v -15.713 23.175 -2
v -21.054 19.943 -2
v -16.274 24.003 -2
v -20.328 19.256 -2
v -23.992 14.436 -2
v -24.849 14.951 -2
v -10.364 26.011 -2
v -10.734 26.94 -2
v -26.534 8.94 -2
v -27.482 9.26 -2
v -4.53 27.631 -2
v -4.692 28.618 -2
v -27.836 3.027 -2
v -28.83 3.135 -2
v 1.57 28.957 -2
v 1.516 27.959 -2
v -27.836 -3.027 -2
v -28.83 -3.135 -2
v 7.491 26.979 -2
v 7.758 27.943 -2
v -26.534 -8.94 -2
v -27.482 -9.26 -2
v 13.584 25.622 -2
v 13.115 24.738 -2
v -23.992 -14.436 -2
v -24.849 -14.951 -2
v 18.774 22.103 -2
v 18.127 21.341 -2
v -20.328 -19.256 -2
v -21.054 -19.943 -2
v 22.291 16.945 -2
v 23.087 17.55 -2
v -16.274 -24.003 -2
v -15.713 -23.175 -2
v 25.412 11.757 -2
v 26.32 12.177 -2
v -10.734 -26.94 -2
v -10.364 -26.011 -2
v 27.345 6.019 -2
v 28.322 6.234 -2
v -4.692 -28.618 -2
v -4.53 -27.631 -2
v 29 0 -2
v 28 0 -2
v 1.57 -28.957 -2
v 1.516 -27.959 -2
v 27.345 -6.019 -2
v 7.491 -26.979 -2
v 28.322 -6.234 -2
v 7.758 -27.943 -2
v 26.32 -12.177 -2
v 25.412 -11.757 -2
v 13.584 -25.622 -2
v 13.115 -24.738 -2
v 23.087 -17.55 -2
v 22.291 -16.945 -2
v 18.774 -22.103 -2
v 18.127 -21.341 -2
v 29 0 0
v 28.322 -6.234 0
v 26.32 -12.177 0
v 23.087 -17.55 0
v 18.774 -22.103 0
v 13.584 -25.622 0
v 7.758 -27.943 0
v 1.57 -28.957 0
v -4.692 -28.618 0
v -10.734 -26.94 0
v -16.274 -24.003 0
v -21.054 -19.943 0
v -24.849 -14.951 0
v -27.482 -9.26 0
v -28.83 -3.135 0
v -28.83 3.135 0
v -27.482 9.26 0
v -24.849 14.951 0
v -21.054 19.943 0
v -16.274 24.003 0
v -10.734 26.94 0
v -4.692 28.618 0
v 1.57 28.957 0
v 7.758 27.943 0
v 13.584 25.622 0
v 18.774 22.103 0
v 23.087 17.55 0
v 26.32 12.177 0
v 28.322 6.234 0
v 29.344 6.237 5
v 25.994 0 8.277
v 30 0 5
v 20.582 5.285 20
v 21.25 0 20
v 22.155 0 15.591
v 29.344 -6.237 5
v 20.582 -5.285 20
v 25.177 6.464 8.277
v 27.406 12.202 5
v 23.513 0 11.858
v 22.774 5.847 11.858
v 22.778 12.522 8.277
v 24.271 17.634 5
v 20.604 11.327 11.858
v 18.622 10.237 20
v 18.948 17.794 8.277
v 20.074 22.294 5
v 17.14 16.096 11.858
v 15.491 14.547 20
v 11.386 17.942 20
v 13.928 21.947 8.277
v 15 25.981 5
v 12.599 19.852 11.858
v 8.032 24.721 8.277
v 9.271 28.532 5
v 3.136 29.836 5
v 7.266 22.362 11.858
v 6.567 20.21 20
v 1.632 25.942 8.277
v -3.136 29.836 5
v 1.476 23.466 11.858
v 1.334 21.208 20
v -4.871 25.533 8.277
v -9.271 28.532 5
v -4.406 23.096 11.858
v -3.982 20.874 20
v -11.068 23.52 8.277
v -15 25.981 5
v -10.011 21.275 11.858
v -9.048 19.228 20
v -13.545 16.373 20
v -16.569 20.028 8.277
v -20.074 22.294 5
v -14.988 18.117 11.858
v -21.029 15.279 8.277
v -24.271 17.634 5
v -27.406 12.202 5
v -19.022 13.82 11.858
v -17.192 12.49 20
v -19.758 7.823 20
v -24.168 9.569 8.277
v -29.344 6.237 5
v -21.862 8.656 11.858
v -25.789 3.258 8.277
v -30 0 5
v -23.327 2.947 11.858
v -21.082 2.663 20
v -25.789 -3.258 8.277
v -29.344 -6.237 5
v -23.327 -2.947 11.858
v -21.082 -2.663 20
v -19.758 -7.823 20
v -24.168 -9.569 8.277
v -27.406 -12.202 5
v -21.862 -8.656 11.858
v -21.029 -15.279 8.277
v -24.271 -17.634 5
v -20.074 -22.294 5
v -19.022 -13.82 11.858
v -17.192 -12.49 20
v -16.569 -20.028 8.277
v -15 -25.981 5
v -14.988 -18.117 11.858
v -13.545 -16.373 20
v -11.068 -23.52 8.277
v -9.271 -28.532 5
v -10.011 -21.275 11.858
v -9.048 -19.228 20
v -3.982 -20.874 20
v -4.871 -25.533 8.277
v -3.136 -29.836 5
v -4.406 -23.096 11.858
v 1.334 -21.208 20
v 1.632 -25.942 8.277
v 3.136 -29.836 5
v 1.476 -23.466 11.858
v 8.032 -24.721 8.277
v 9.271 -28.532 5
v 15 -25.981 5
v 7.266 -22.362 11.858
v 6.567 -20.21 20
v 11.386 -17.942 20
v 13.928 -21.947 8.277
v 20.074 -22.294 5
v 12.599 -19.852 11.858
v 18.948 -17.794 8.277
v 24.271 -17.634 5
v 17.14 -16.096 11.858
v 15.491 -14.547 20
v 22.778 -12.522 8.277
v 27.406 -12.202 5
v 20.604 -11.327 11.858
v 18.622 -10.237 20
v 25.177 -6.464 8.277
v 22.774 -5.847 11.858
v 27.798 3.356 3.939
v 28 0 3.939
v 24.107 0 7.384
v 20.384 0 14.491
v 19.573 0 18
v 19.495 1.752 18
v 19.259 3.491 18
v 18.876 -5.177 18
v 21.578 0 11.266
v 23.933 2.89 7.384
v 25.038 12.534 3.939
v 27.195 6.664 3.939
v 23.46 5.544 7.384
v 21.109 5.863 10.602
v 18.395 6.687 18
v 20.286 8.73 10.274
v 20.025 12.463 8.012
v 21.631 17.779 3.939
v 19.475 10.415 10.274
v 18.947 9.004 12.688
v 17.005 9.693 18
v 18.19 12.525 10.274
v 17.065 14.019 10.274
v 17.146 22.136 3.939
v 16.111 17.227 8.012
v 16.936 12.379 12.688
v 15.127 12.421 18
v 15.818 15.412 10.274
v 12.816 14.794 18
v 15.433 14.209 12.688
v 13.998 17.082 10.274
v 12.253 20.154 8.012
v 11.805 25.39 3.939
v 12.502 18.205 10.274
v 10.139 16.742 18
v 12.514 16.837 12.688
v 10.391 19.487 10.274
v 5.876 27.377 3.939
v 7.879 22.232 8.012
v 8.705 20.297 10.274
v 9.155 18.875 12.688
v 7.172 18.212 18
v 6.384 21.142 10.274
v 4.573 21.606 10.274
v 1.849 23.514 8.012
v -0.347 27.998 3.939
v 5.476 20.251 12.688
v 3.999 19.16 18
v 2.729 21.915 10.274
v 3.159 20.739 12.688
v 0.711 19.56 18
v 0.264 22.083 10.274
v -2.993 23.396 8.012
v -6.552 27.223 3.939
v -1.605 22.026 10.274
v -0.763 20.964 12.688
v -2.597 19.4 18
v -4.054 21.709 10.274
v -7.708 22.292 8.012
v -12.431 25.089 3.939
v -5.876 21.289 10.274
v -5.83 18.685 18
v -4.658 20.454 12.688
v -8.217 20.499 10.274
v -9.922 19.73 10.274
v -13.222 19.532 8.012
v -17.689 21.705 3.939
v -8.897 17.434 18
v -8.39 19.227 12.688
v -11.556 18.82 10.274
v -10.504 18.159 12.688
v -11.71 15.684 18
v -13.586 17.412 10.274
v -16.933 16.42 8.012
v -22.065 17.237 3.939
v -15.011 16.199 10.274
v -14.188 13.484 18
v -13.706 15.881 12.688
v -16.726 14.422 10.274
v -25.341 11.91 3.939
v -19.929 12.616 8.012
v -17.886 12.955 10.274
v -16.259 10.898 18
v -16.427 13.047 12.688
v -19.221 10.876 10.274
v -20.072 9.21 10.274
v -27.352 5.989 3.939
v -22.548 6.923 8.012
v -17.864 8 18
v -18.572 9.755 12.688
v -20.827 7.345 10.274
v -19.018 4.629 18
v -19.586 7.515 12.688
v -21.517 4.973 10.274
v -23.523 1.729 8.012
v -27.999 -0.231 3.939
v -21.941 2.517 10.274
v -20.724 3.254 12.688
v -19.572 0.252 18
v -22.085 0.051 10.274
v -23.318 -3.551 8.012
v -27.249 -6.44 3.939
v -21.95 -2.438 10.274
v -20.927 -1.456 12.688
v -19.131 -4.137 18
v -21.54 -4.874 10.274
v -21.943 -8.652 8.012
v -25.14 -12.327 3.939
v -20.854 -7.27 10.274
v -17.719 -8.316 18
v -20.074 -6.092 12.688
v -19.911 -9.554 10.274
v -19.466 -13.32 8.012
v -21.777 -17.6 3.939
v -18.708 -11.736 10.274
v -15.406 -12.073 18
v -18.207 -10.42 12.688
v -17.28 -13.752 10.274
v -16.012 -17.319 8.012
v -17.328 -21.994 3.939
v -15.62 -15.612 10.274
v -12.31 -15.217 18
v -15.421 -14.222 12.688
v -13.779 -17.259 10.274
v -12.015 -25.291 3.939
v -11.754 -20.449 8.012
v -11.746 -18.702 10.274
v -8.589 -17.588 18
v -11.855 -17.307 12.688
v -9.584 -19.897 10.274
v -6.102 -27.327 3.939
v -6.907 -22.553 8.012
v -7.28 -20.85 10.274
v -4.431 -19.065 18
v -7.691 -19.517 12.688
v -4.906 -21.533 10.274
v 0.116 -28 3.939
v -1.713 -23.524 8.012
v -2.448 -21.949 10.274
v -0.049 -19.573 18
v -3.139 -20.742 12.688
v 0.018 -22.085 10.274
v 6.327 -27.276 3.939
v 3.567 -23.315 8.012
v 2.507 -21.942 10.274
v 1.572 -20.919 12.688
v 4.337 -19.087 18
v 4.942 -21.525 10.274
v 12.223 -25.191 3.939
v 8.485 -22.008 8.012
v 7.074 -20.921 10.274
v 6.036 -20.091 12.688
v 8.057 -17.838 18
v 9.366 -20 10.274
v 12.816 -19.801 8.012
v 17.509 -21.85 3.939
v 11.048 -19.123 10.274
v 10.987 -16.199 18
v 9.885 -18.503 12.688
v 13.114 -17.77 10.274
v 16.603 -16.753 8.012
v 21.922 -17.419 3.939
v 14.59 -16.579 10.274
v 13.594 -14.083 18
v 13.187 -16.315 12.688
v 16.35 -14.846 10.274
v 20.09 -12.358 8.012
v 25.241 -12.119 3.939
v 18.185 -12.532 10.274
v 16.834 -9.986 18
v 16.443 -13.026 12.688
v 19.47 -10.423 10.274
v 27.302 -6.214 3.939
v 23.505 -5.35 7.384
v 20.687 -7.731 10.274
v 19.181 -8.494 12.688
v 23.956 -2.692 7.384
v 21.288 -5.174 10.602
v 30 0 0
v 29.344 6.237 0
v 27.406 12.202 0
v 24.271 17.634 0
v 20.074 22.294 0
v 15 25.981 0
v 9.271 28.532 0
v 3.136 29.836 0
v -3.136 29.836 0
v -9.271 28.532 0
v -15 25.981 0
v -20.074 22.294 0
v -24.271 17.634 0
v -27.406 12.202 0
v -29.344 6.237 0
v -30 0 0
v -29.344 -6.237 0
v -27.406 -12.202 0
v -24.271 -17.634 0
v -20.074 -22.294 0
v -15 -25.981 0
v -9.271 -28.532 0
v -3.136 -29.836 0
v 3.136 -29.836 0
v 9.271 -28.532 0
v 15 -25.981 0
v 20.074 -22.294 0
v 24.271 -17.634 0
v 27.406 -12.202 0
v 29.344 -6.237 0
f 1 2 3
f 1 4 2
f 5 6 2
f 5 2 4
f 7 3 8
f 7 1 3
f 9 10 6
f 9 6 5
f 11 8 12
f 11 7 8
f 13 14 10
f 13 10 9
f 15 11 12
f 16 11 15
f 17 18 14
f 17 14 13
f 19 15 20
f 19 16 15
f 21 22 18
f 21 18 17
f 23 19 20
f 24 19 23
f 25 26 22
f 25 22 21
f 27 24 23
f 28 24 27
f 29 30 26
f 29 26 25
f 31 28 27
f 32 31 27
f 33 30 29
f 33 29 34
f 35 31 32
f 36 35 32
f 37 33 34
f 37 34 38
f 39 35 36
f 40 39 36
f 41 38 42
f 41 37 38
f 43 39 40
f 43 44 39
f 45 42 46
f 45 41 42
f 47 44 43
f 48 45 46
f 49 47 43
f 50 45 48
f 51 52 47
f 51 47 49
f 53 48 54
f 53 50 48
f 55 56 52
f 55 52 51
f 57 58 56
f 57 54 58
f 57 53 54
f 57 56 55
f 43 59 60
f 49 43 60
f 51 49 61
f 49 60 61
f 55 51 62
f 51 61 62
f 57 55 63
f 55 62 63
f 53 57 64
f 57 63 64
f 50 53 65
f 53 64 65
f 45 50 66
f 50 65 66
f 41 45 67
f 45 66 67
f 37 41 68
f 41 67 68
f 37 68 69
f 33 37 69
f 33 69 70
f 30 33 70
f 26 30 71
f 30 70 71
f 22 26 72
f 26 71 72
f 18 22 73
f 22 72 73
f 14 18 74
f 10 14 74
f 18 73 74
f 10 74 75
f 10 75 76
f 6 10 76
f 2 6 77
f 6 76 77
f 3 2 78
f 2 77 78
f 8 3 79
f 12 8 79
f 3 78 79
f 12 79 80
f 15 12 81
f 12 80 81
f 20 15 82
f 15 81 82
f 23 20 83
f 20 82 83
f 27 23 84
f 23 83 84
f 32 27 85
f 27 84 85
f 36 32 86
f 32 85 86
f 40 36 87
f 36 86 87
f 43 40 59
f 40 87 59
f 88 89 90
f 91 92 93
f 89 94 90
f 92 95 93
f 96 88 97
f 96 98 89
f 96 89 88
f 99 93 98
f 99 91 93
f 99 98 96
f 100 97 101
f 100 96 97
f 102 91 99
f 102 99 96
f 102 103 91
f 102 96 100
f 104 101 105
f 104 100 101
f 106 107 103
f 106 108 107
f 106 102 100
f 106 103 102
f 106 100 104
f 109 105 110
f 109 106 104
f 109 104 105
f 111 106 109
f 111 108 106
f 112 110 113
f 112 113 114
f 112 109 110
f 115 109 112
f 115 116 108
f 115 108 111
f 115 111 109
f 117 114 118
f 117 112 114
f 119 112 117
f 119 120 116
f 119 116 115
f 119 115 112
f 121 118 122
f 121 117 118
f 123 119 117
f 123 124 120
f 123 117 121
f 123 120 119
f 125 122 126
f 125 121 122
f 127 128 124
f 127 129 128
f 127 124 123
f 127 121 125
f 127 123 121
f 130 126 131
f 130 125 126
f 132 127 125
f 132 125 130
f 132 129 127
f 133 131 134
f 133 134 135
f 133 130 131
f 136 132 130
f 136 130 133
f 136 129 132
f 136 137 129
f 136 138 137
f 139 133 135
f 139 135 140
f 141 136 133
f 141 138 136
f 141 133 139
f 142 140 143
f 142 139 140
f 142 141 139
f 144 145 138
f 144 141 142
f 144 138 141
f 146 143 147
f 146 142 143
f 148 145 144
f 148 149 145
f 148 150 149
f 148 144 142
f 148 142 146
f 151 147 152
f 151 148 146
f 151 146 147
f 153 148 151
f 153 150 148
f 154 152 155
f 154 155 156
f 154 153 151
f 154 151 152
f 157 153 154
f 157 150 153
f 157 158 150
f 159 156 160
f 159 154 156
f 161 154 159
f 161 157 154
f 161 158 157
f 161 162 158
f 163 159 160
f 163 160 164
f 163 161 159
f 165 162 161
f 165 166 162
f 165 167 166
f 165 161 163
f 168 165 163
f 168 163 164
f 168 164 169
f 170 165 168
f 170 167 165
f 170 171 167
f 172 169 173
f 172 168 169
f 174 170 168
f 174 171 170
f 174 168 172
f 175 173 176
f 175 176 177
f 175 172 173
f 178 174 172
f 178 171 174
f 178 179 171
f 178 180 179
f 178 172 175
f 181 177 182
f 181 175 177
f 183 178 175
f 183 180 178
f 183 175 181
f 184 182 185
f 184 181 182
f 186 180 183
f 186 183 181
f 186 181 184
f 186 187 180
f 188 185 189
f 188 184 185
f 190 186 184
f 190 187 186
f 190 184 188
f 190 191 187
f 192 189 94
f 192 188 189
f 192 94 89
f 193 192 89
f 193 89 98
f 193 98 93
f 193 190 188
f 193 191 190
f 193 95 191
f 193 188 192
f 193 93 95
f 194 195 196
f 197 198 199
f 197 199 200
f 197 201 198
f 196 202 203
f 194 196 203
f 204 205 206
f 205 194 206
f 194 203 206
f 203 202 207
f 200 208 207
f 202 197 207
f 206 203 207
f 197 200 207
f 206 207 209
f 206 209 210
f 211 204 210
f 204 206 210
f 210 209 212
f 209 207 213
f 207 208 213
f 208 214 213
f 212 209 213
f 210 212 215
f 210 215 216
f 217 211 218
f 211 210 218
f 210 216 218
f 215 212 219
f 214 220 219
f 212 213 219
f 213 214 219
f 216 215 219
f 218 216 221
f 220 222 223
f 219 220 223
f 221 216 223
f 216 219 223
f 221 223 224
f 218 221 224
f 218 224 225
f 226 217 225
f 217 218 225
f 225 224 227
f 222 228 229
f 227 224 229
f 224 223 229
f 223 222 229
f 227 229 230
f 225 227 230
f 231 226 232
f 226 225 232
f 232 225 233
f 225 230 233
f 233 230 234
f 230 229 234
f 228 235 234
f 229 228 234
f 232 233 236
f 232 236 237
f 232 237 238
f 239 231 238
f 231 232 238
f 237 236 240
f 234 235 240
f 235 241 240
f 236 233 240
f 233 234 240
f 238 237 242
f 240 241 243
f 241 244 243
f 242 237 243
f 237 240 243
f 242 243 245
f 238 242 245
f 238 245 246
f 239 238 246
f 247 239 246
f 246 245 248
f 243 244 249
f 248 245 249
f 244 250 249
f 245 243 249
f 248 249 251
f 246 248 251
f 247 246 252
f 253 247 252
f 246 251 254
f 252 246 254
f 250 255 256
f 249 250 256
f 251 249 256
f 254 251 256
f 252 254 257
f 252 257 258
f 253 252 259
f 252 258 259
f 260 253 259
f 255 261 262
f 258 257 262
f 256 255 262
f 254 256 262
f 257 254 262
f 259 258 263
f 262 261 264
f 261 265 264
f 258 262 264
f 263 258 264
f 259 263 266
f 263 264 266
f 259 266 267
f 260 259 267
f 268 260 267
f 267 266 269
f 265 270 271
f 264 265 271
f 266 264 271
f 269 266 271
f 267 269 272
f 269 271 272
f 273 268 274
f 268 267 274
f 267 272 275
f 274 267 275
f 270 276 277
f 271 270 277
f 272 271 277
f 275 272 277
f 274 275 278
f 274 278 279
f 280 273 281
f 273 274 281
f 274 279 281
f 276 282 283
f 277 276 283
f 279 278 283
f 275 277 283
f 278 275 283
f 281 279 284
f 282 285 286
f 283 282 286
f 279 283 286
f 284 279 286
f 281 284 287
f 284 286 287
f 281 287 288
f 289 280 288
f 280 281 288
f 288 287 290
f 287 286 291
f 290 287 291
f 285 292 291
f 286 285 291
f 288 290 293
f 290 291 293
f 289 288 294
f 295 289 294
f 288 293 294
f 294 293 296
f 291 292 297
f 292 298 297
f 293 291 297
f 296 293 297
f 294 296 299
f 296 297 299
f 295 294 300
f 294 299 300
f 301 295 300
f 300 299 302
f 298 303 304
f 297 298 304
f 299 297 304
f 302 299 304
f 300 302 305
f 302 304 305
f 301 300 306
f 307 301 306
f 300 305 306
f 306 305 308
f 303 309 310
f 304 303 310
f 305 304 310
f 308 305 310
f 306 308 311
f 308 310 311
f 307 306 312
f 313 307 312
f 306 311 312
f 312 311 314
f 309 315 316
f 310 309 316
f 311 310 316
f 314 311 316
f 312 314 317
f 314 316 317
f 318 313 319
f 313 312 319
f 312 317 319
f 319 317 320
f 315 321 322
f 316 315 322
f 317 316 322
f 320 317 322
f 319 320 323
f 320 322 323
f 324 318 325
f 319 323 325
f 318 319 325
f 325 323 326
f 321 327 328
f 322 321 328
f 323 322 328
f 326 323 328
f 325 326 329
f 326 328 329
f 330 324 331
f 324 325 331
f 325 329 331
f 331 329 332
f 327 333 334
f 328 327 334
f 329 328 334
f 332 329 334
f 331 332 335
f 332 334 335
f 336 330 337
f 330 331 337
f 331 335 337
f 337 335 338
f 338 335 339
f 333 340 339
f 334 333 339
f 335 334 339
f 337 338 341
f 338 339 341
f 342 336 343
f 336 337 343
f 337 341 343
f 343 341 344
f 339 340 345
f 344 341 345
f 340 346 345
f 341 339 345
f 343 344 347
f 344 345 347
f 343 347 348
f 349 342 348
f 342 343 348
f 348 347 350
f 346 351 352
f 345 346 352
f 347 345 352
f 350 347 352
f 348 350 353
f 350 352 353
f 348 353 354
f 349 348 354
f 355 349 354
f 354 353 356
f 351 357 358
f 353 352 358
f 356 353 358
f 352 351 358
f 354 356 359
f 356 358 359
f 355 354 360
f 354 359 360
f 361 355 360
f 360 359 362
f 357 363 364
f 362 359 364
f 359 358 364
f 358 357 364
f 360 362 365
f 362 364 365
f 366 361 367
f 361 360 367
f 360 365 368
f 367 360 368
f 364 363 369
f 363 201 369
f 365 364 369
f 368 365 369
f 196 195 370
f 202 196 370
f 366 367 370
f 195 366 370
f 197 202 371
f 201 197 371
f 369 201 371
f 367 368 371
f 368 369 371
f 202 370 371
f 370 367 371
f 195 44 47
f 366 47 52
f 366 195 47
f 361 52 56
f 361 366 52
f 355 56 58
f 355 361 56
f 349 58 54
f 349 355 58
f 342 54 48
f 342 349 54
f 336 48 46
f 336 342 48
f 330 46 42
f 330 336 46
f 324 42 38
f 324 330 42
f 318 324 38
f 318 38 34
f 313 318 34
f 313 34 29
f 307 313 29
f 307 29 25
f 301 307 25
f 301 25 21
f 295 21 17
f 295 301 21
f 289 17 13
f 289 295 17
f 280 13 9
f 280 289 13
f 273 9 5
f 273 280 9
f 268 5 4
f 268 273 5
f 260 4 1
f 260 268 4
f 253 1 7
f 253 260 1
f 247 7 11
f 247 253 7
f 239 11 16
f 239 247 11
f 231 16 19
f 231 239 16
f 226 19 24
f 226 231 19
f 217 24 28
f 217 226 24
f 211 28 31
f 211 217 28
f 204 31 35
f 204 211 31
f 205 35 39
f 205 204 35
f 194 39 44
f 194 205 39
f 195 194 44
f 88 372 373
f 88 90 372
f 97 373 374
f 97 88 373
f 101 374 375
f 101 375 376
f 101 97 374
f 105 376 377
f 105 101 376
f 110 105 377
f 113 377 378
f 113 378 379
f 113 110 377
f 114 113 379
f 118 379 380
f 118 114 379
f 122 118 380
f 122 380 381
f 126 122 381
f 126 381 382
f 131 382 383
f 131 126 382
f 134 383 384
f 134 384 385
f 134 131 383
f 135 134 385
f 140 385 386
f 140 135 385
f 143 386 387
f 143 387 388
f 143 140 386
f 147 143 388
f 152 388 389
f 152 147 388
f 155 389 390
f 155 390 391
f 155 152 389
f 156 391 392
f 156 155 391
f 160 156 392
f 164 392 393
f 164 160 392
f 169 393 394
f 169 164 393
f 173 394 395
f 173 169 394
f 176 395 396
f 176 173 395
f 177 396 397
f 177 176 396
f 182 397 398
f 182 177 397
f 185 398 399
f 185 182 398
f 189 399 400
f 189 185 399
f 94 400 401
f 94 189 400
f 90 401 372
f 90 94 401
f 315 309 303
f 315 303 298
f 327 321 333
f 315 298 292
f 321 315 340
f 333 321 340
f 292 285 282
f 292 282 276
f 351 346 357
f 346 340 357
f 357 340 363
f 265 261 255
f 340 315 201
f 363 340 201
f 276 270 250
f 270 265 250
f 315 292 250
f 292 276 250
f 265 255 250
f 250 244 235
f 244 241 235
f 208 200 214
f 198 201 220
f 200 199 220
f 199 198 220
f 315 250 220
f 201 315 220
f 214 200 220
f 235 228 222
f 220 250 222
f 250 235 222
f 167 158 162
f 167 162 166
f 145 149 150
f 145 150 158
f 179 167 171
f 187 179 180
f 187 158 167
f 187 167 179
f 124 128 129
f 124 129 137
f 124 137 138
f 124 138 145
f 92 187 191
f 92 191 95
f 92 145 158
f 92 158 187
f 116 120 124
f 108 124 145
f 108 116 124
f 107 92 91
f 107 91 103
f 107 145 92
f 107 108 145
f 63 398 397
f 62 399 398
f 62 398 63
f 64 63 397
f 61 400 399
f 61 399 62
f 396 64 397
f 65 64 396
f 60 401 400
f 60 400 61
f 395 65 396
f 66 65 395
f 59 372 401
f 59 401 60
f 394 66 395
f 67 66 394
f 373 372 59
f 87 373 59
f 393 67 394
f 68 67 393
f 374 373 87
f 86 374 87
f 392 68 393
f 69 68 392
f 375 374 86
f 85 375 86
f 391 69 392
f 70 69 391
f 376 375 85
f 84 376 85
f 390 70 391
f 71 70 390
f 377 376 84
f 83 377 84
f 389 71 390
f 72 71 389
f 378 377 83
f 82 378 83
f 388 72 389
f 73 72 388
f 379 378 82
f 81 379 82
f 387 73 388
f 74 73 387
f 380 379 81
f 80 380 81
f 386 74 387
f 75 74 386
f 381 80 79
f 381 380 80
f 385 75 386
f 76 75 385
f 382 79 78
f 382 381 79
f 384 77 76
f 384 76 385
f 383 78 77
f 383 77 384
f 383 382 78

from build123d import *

# Parameters (mm, degrees)
F2_T     = -2
F3_R     = 29
F3_R_2   = 28
F4_DEPTH = 2


with BuildPart() as f1:
    # F0 (on Front) → F1 (revolve)
    with BuildSketch(Plane.XZ):
        with BuildLine():
            Line((0, 20), (0, 0))
            Line((0, 0), (30, 0))
            Line((30, 0), (30, 5))
            add(Edge.make_bspline(
                [(30, 5), (23.725748, 9.086438), (22.380861, 13.243363), (21.25, 20)],
                knots=[0, 0, 0, 0, 17.365555, 17.365555, 17.365555, 17.365555], degree=3))
            Line((21.25, 20), (0, 20))
        make_face()
    revolve(axis=Axis((0, 0, 10), (0, 0, 1)))

    # F2
    f2_openings = [f1.faces().sort_by_distance(p)[0] for p in [
        (0, 0, 0),
    ]]
    offset(amount=F2_T, openings=f2_openings)

    # F3 (on face) → F4 (join)
    with BuildSketch(Plane(origin=(0, 0, 0), x_dir=(1, 0, 0), z_dir=(0, 0, -1))):
        Circle(F3_R)
        Circle(F3_R_2, mode=Mode.SUBTRACT)
    extrude(amount=F4_DEPTH)


solid = f1.part
